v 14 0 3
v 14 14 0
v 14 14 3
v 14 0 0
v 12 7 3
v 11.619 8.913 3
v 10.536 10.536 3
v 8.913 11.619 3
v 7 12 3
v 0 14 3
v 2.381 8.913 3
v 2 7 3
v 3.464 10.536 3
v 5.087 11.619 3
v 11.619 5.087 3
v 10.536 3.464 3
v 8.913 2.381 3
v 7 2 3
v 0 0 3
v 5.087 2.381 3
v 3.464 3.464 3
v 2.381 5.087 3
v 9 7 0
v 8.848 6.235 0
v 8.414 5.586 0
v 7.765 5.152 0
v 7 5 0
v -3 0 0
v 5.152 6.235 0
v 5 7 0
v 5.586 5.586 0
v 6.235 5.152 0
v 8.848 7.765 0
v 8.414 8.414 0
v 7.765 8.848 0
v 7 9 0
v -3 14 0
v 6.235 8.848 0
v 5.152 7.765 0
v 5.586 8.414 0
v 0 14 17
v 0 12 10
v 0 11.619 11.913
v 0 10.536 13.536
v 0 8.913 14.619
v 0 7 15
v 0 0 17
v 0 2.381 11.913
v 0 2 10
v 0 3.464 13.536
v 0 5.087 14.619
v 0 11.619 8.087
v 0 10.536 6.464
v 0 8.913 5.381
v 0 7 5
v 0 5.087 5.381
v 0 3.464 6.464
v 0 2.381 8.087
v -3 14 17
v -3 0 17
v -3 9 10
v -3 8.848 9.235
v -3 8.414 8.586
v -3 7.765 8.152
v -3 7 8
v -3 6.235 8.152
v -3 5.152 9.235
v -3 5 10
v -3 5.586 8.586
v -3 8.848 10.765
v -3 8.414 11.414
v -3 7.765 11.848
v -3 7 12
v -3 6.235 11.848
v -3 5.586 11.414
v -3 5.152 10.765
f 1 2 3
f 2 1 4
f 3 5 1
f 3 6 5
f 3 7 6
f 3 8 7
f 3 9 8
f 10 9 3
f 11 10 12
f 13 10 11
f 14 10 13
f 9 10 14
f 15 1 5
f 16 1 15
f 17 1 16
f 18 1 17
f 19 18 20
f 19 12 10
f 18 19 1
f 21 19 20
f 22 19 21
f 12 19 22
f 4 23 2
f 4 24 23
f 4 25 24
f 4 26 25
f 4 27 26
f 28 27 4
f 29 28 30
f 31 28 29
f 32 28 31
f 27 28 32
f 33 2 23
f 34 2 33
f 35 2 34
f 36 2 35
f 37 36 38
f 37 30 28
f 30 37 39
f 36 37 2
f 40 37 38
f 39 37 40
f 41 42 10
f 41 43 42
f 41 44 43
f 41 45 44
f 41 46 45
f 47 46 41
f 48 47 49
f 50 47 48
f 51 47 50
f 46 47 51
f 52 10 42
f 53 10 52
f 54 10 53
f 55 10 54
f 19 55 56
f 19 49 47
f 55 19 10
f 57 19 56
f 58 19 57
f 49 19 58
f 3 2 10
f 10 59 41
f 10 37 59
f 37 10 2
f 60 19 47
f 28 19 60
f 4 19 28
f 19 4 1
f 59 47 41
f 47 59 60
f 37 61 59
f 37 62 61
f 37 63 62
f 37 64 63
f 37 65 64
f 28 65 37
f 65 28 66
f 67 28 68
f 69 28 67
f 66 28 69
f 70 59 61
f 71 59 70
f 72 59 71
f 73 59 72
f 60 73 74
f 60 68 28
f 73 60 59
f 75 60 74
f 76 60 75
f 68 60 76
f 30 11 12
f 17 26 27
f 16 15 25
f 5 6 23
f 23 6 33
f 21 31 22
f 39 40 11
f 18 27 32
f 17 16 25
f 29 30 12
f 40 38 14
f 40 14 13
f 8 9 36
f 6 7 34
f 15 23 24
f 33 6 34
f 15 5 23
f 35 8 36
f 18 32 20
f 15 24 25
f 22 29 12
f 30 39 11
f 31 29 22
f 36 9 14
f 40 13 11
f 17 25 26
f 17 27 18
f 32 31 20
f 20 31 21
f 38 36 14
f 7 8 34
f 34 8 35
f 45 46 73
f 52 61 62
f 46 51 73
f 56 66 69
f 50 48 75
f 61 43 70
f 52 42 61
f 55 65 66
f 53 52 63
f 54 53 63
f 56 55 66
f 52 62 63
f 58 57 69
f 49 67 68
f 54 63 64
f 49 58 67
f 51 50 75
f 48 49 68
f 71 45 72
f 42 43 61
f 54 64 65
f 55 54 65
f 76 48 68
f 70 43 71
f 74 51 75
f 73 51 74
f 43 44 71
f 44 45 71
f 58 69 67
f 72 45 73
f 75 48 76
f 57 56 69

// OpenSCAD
module bracket(r = 2, thickness = 3, padding = 5) {
    difference() {
        union() {
            cube([r * 2 + padding * 2, r * 2 + padding * 2, thickness]);
            translate([-thickness, 0, 0]) {
                cube([thickness, r * 2 + padding * 2, thickness + r * 2 + padding * 2]);
            }
        }
        union() {
            translate([padding + r, padding + r, 0]) {
                cylinder(r1 = r, r2 = r + thickness, h = thickness);
            }
            rotate([0, 270, 0]) 
            translate([thickness + padding + r, padding + r, 0]) {
                cylinder(r2 = r, r1 = r + thickness, h = thickness);
            }
        }
    }
}

bracket();
